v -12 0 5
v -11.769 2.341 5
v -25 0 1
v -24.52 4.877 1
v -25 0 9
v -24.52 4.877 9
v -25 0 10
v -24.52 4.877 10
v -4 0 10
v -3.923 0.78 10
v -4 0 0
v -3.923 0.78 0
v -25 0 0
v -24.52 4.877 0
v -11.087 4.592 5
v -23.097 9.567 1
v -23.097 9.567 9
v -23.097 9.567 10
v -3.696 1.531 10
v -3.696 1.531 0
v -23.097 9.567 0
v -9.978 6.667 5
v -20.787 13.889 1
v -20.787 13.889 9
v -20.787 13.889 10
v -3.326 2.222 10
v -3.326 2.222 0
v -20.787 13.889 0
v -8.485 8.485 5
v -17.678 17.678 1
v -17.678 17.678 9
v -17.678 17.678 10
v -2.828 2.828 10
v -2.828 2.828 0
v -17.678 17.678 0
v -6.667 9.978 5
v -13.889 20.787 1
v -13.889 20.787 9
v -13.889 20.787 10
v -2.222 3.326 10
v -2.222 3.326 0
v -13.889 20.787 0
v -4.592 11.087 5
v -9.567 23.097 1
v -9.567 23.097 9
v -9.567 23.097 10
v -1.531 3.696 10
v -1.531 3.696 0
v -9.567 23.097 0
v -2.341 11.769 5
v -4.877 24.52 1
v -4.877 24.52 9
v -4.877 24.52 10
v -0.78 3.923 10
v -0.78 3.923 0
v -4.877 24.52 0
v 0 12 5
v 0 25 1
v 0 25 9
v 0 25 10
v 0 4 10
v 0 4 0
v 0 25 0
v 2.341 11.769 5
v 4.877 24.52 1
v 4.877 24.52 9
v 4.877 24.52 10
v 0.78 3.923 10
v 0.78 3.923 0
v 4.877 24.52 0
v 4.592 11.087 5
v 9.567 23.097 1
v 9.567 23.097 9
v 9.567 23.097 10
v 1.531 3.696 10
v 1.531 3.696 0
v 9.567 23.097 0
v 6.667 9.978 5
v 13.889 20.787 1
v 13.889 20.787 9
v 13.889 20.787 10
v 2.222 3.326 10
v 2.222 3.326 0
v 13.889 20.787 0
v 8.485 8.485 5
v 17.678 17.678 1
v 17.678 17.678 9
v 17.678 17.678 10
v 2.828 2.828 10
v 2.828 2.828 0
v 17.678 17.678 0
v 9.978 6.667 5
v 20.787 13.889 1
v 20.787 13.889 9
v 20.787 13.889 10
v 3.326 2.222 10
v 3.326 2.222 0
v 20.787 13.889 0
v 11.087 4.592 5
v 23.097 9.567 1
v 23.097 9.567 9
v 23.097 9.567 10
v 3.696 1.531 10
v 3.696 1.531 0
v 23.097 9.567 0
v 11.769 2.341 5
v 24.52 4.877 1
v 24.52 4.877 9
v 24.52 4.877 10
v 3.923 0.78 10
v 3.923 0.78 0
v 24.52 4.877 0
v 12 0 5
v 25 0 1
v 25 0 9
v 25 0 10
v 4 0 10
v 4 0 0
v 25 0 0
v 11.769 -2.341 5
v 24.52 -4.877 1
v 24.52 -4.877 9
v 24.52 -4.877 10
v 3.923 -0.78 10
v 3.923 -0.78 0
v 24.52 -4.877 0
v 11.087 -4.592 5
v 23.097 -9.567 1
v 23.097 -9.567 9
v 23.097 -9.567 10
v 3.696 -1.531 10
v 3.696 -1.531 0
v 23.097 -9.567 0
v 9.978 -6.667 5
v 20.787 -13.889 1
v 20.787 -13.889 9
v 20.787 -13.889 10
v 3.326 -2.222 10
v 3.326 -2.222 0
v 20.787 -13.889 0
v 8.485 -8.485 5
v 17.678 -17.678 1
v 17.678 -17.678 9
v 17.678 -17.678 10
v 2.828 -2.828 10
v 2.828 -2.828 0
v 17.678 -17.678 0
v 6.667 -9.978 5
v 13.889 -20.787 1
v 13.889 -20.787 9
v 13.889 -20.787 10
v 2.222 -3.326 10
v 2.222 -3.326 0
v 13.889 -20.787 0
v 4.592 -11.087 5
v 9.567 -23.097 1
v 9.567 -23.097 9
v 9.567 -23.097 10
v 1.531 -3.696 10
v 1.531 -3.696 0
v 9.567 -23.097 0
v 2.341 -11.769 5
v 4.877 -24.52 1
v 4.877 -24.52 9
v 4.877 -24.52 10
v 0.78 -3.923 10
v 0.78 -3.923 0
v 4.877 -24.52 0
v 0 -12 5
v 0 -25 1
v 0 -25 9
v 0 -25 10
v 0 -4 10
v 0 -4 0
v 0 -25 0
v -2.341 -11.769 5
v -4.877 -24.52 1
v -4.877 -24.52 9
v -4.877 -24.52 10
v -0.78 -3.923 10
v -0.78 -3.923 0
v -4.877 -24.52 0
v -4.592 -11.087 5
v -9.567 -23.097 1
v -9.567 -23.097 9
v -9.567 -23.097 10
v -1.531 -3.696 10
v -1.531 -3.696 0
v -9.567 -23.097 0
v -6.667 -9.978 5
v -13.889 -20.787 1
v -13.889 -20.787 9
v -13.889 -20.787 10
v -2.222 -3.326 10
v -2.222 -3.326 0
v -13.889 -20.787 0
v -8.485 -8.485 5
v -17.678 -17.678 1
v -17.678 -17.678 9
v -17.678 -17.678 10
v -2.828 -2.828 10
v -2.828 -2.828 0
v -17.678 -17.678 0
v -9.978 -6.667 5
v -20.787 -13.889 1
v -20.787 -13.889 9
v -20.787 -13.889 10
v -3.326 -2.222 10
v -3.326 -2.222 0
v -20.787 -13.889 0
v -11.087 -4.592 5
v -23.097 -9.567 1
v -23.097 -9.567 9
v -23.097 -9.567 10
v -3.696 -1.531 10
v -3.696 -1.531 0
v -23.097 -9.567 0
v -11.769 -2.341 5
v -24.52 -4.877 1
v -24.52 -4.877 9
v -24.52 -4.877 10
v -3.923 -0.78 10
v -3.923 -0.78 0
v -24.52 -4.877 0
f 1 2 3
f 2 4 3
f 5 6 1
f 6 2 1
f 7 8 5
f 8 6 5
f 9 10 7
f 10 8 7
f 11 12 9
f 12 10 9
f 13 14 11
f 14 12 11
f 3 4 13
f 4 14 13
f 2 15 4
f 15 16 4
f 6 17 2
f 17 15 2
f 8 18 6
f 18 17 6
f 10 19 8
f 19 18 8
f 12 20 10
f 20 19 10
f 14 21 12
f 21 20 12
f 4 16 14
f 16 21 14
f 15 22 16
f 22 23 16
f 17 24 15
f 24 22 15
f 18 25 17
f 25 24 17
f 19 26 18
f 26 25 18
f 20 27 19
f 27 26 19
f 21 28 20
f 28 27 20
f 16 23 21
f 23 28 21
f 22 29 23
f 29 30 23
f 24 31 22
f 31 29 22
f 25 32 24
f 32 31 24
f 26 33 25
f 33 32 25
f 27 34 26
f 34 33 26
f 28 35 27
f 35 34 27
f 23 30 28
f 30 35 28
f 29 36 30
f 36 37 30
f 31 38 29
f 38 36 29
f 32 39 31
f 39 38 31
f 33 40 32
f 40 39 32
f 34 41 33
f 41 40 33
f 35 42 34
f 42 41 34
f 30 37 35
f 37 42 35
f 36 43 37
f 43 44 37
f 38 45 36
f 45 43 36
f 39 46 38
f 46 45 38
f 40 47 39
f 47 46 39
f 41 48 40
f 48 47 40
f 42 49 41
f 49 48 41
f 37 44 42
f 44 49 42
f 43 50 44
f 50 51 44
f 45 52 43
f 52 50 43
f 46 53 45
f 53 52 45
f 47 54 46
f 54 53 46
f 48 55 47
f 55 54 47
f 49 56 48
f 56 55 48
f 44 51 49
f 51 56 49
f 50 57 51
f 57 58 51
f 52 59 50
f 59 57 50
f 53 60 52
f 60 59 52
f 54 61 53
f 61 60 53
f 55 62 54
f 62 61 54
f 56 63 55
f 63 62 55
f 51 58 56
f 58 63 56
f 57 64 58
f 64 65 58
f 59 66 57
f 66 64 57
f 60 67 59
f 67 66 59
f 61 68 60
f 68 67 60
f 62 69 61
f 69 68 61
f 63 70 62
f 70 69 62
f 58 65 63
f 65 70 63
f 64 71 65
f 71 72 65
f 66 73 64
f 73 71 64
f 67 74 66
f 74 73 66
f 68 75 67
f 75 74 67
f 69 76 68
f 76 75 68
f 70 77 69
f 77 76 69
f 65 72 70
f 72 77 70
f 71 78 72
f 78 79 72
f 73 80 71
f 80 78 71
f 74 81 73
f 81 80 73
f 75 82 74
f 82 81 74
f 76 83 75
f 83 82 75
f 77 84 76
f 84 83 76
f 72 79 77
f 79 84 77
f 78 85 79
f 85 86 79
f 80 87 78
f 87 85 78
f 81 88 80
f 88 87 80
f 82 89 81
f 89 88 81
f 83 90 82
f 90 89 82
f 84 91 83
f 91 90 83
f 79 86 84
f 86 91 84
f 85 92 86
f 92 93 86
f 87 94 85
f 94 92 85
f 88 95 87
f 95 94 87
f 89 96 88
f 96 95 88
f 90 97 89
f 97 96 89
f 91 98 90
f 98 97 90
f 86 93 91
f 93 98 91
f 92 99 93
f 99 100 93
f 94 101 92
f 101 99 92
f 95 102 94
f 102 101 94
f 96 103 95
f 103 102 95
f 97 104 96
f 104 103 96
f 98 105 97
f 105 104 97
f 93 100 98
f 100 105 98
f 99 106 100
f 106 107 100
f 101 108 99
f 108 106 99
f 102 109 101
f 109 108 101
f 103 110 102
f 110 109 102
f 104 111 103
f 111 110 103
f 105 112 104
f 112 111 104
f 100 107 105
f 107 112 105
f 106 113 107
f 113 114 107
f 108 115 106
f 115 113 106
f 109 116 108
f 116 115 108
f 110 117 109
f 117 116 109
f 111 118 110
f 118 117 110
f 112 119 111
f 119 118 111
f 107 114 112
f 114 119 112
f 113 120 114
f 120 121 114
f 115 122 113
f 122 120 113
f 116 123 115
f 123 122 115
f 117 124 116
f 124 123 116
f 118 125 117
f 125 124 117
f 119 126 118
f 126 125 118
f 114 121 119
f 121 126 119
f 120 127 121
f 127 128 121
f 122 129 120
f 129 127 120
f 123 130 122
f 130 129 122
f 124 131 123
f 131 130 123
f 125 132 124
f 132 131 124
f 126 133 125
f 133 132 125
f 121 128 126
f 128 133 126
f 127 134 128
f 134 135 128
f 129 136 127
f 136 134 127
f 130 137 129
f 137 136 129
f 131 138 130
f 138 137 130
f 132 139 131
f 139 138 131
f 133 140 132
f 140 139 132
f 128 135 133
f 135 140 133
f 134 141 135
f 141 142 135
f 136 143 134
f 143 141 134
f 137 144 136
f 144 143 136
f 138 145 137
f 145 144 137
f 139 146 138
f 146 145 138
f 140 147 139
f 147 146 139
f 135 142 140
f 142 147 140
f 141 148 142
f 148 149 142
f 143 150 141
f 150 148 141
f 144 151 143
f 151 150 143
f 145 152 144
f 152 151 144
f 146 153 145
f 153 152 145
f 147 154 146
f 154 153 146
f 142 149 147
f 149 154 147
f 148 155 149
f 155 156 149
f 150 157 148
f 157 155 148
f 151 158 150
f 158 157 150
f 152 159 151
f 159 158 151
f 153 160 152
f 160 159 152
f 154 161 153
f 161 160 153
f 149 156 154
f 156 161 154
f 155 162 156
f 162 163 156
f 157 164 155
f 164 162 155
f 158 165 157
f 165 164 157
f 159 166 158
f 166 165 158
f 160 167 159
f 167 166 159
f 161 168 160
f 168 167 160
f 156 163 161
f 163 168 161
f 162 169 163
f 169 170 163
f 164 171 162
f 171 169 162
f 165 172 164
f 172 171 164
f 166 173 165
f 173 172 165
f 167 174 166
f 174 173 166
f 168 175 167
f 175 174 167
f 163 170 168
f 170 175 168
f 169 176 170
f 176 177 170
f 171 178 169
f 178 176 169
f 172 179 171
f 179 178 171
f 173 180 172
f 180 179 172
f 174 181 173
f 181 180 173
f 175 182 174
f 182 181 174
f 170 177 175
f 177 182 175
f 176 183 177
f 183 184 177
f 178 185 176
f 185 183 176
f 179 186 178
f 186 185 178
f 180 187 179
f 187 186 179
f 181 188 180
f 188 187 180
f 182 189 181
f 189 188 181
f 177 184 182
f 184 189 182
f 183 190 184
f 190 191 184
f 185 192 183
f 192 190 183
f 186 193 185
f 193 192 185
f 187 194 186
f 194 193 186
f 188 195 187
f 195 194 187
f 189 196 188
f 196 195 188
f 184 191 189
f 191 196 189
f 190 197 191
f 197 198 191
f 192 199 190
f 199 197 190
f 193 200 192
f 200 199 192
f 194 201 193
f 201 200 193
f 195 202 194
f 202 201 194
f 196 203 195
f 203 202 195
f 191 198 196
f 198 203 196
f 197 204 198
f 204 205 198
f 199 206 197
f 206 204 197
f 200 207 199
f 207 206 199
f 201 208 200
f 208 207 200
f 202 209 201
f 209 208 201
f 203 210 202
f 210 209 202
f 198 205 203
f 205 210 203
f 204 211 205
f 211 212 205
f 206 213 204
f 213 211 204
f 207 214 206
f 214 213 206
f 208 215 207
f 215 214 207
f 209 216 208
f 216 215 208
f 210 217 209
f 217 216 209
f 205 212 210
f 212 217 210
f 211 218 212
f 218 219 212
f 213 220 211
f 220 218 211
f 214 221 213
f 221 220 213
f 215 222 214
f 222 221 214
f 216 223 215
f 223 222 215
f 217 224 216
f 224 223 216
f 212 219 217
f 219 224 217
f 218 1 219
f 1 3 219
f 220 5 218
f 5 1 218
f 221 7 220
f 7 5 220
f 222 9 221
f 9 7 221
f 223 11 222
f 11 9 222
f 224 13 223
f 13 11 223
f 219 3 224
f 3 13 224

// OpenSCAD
$fn = 32;

// ----------------------------------------------------------------------
// Revolved part: V-groove pulley R25
// ----------------------------------------------------------------------

// --- parameters (mm) ---
bore_r = 4;               // bore radius
rim_r = 25;               // rim radius
rim_t = 10;               // rim width
groove_r = 12;            // groove root radius
groove_w = 4;             // groove half width
revolve_angle = 360;      // revolve sweep, degrees

bore_d = 2 * bore_r;
rim_d = 2 * rim_r;
groove_d = 2 * groove_r;

profile = [[4, 0], [25, 0], [25, 1], [12, 5], [25, 9], [25, 10], [4, 10]];  // primary outline, 7 points, counter clockwise

// --- the one profile operation ---
rotate_extrude(angle = revolve_angle) polygon(points = profile);
